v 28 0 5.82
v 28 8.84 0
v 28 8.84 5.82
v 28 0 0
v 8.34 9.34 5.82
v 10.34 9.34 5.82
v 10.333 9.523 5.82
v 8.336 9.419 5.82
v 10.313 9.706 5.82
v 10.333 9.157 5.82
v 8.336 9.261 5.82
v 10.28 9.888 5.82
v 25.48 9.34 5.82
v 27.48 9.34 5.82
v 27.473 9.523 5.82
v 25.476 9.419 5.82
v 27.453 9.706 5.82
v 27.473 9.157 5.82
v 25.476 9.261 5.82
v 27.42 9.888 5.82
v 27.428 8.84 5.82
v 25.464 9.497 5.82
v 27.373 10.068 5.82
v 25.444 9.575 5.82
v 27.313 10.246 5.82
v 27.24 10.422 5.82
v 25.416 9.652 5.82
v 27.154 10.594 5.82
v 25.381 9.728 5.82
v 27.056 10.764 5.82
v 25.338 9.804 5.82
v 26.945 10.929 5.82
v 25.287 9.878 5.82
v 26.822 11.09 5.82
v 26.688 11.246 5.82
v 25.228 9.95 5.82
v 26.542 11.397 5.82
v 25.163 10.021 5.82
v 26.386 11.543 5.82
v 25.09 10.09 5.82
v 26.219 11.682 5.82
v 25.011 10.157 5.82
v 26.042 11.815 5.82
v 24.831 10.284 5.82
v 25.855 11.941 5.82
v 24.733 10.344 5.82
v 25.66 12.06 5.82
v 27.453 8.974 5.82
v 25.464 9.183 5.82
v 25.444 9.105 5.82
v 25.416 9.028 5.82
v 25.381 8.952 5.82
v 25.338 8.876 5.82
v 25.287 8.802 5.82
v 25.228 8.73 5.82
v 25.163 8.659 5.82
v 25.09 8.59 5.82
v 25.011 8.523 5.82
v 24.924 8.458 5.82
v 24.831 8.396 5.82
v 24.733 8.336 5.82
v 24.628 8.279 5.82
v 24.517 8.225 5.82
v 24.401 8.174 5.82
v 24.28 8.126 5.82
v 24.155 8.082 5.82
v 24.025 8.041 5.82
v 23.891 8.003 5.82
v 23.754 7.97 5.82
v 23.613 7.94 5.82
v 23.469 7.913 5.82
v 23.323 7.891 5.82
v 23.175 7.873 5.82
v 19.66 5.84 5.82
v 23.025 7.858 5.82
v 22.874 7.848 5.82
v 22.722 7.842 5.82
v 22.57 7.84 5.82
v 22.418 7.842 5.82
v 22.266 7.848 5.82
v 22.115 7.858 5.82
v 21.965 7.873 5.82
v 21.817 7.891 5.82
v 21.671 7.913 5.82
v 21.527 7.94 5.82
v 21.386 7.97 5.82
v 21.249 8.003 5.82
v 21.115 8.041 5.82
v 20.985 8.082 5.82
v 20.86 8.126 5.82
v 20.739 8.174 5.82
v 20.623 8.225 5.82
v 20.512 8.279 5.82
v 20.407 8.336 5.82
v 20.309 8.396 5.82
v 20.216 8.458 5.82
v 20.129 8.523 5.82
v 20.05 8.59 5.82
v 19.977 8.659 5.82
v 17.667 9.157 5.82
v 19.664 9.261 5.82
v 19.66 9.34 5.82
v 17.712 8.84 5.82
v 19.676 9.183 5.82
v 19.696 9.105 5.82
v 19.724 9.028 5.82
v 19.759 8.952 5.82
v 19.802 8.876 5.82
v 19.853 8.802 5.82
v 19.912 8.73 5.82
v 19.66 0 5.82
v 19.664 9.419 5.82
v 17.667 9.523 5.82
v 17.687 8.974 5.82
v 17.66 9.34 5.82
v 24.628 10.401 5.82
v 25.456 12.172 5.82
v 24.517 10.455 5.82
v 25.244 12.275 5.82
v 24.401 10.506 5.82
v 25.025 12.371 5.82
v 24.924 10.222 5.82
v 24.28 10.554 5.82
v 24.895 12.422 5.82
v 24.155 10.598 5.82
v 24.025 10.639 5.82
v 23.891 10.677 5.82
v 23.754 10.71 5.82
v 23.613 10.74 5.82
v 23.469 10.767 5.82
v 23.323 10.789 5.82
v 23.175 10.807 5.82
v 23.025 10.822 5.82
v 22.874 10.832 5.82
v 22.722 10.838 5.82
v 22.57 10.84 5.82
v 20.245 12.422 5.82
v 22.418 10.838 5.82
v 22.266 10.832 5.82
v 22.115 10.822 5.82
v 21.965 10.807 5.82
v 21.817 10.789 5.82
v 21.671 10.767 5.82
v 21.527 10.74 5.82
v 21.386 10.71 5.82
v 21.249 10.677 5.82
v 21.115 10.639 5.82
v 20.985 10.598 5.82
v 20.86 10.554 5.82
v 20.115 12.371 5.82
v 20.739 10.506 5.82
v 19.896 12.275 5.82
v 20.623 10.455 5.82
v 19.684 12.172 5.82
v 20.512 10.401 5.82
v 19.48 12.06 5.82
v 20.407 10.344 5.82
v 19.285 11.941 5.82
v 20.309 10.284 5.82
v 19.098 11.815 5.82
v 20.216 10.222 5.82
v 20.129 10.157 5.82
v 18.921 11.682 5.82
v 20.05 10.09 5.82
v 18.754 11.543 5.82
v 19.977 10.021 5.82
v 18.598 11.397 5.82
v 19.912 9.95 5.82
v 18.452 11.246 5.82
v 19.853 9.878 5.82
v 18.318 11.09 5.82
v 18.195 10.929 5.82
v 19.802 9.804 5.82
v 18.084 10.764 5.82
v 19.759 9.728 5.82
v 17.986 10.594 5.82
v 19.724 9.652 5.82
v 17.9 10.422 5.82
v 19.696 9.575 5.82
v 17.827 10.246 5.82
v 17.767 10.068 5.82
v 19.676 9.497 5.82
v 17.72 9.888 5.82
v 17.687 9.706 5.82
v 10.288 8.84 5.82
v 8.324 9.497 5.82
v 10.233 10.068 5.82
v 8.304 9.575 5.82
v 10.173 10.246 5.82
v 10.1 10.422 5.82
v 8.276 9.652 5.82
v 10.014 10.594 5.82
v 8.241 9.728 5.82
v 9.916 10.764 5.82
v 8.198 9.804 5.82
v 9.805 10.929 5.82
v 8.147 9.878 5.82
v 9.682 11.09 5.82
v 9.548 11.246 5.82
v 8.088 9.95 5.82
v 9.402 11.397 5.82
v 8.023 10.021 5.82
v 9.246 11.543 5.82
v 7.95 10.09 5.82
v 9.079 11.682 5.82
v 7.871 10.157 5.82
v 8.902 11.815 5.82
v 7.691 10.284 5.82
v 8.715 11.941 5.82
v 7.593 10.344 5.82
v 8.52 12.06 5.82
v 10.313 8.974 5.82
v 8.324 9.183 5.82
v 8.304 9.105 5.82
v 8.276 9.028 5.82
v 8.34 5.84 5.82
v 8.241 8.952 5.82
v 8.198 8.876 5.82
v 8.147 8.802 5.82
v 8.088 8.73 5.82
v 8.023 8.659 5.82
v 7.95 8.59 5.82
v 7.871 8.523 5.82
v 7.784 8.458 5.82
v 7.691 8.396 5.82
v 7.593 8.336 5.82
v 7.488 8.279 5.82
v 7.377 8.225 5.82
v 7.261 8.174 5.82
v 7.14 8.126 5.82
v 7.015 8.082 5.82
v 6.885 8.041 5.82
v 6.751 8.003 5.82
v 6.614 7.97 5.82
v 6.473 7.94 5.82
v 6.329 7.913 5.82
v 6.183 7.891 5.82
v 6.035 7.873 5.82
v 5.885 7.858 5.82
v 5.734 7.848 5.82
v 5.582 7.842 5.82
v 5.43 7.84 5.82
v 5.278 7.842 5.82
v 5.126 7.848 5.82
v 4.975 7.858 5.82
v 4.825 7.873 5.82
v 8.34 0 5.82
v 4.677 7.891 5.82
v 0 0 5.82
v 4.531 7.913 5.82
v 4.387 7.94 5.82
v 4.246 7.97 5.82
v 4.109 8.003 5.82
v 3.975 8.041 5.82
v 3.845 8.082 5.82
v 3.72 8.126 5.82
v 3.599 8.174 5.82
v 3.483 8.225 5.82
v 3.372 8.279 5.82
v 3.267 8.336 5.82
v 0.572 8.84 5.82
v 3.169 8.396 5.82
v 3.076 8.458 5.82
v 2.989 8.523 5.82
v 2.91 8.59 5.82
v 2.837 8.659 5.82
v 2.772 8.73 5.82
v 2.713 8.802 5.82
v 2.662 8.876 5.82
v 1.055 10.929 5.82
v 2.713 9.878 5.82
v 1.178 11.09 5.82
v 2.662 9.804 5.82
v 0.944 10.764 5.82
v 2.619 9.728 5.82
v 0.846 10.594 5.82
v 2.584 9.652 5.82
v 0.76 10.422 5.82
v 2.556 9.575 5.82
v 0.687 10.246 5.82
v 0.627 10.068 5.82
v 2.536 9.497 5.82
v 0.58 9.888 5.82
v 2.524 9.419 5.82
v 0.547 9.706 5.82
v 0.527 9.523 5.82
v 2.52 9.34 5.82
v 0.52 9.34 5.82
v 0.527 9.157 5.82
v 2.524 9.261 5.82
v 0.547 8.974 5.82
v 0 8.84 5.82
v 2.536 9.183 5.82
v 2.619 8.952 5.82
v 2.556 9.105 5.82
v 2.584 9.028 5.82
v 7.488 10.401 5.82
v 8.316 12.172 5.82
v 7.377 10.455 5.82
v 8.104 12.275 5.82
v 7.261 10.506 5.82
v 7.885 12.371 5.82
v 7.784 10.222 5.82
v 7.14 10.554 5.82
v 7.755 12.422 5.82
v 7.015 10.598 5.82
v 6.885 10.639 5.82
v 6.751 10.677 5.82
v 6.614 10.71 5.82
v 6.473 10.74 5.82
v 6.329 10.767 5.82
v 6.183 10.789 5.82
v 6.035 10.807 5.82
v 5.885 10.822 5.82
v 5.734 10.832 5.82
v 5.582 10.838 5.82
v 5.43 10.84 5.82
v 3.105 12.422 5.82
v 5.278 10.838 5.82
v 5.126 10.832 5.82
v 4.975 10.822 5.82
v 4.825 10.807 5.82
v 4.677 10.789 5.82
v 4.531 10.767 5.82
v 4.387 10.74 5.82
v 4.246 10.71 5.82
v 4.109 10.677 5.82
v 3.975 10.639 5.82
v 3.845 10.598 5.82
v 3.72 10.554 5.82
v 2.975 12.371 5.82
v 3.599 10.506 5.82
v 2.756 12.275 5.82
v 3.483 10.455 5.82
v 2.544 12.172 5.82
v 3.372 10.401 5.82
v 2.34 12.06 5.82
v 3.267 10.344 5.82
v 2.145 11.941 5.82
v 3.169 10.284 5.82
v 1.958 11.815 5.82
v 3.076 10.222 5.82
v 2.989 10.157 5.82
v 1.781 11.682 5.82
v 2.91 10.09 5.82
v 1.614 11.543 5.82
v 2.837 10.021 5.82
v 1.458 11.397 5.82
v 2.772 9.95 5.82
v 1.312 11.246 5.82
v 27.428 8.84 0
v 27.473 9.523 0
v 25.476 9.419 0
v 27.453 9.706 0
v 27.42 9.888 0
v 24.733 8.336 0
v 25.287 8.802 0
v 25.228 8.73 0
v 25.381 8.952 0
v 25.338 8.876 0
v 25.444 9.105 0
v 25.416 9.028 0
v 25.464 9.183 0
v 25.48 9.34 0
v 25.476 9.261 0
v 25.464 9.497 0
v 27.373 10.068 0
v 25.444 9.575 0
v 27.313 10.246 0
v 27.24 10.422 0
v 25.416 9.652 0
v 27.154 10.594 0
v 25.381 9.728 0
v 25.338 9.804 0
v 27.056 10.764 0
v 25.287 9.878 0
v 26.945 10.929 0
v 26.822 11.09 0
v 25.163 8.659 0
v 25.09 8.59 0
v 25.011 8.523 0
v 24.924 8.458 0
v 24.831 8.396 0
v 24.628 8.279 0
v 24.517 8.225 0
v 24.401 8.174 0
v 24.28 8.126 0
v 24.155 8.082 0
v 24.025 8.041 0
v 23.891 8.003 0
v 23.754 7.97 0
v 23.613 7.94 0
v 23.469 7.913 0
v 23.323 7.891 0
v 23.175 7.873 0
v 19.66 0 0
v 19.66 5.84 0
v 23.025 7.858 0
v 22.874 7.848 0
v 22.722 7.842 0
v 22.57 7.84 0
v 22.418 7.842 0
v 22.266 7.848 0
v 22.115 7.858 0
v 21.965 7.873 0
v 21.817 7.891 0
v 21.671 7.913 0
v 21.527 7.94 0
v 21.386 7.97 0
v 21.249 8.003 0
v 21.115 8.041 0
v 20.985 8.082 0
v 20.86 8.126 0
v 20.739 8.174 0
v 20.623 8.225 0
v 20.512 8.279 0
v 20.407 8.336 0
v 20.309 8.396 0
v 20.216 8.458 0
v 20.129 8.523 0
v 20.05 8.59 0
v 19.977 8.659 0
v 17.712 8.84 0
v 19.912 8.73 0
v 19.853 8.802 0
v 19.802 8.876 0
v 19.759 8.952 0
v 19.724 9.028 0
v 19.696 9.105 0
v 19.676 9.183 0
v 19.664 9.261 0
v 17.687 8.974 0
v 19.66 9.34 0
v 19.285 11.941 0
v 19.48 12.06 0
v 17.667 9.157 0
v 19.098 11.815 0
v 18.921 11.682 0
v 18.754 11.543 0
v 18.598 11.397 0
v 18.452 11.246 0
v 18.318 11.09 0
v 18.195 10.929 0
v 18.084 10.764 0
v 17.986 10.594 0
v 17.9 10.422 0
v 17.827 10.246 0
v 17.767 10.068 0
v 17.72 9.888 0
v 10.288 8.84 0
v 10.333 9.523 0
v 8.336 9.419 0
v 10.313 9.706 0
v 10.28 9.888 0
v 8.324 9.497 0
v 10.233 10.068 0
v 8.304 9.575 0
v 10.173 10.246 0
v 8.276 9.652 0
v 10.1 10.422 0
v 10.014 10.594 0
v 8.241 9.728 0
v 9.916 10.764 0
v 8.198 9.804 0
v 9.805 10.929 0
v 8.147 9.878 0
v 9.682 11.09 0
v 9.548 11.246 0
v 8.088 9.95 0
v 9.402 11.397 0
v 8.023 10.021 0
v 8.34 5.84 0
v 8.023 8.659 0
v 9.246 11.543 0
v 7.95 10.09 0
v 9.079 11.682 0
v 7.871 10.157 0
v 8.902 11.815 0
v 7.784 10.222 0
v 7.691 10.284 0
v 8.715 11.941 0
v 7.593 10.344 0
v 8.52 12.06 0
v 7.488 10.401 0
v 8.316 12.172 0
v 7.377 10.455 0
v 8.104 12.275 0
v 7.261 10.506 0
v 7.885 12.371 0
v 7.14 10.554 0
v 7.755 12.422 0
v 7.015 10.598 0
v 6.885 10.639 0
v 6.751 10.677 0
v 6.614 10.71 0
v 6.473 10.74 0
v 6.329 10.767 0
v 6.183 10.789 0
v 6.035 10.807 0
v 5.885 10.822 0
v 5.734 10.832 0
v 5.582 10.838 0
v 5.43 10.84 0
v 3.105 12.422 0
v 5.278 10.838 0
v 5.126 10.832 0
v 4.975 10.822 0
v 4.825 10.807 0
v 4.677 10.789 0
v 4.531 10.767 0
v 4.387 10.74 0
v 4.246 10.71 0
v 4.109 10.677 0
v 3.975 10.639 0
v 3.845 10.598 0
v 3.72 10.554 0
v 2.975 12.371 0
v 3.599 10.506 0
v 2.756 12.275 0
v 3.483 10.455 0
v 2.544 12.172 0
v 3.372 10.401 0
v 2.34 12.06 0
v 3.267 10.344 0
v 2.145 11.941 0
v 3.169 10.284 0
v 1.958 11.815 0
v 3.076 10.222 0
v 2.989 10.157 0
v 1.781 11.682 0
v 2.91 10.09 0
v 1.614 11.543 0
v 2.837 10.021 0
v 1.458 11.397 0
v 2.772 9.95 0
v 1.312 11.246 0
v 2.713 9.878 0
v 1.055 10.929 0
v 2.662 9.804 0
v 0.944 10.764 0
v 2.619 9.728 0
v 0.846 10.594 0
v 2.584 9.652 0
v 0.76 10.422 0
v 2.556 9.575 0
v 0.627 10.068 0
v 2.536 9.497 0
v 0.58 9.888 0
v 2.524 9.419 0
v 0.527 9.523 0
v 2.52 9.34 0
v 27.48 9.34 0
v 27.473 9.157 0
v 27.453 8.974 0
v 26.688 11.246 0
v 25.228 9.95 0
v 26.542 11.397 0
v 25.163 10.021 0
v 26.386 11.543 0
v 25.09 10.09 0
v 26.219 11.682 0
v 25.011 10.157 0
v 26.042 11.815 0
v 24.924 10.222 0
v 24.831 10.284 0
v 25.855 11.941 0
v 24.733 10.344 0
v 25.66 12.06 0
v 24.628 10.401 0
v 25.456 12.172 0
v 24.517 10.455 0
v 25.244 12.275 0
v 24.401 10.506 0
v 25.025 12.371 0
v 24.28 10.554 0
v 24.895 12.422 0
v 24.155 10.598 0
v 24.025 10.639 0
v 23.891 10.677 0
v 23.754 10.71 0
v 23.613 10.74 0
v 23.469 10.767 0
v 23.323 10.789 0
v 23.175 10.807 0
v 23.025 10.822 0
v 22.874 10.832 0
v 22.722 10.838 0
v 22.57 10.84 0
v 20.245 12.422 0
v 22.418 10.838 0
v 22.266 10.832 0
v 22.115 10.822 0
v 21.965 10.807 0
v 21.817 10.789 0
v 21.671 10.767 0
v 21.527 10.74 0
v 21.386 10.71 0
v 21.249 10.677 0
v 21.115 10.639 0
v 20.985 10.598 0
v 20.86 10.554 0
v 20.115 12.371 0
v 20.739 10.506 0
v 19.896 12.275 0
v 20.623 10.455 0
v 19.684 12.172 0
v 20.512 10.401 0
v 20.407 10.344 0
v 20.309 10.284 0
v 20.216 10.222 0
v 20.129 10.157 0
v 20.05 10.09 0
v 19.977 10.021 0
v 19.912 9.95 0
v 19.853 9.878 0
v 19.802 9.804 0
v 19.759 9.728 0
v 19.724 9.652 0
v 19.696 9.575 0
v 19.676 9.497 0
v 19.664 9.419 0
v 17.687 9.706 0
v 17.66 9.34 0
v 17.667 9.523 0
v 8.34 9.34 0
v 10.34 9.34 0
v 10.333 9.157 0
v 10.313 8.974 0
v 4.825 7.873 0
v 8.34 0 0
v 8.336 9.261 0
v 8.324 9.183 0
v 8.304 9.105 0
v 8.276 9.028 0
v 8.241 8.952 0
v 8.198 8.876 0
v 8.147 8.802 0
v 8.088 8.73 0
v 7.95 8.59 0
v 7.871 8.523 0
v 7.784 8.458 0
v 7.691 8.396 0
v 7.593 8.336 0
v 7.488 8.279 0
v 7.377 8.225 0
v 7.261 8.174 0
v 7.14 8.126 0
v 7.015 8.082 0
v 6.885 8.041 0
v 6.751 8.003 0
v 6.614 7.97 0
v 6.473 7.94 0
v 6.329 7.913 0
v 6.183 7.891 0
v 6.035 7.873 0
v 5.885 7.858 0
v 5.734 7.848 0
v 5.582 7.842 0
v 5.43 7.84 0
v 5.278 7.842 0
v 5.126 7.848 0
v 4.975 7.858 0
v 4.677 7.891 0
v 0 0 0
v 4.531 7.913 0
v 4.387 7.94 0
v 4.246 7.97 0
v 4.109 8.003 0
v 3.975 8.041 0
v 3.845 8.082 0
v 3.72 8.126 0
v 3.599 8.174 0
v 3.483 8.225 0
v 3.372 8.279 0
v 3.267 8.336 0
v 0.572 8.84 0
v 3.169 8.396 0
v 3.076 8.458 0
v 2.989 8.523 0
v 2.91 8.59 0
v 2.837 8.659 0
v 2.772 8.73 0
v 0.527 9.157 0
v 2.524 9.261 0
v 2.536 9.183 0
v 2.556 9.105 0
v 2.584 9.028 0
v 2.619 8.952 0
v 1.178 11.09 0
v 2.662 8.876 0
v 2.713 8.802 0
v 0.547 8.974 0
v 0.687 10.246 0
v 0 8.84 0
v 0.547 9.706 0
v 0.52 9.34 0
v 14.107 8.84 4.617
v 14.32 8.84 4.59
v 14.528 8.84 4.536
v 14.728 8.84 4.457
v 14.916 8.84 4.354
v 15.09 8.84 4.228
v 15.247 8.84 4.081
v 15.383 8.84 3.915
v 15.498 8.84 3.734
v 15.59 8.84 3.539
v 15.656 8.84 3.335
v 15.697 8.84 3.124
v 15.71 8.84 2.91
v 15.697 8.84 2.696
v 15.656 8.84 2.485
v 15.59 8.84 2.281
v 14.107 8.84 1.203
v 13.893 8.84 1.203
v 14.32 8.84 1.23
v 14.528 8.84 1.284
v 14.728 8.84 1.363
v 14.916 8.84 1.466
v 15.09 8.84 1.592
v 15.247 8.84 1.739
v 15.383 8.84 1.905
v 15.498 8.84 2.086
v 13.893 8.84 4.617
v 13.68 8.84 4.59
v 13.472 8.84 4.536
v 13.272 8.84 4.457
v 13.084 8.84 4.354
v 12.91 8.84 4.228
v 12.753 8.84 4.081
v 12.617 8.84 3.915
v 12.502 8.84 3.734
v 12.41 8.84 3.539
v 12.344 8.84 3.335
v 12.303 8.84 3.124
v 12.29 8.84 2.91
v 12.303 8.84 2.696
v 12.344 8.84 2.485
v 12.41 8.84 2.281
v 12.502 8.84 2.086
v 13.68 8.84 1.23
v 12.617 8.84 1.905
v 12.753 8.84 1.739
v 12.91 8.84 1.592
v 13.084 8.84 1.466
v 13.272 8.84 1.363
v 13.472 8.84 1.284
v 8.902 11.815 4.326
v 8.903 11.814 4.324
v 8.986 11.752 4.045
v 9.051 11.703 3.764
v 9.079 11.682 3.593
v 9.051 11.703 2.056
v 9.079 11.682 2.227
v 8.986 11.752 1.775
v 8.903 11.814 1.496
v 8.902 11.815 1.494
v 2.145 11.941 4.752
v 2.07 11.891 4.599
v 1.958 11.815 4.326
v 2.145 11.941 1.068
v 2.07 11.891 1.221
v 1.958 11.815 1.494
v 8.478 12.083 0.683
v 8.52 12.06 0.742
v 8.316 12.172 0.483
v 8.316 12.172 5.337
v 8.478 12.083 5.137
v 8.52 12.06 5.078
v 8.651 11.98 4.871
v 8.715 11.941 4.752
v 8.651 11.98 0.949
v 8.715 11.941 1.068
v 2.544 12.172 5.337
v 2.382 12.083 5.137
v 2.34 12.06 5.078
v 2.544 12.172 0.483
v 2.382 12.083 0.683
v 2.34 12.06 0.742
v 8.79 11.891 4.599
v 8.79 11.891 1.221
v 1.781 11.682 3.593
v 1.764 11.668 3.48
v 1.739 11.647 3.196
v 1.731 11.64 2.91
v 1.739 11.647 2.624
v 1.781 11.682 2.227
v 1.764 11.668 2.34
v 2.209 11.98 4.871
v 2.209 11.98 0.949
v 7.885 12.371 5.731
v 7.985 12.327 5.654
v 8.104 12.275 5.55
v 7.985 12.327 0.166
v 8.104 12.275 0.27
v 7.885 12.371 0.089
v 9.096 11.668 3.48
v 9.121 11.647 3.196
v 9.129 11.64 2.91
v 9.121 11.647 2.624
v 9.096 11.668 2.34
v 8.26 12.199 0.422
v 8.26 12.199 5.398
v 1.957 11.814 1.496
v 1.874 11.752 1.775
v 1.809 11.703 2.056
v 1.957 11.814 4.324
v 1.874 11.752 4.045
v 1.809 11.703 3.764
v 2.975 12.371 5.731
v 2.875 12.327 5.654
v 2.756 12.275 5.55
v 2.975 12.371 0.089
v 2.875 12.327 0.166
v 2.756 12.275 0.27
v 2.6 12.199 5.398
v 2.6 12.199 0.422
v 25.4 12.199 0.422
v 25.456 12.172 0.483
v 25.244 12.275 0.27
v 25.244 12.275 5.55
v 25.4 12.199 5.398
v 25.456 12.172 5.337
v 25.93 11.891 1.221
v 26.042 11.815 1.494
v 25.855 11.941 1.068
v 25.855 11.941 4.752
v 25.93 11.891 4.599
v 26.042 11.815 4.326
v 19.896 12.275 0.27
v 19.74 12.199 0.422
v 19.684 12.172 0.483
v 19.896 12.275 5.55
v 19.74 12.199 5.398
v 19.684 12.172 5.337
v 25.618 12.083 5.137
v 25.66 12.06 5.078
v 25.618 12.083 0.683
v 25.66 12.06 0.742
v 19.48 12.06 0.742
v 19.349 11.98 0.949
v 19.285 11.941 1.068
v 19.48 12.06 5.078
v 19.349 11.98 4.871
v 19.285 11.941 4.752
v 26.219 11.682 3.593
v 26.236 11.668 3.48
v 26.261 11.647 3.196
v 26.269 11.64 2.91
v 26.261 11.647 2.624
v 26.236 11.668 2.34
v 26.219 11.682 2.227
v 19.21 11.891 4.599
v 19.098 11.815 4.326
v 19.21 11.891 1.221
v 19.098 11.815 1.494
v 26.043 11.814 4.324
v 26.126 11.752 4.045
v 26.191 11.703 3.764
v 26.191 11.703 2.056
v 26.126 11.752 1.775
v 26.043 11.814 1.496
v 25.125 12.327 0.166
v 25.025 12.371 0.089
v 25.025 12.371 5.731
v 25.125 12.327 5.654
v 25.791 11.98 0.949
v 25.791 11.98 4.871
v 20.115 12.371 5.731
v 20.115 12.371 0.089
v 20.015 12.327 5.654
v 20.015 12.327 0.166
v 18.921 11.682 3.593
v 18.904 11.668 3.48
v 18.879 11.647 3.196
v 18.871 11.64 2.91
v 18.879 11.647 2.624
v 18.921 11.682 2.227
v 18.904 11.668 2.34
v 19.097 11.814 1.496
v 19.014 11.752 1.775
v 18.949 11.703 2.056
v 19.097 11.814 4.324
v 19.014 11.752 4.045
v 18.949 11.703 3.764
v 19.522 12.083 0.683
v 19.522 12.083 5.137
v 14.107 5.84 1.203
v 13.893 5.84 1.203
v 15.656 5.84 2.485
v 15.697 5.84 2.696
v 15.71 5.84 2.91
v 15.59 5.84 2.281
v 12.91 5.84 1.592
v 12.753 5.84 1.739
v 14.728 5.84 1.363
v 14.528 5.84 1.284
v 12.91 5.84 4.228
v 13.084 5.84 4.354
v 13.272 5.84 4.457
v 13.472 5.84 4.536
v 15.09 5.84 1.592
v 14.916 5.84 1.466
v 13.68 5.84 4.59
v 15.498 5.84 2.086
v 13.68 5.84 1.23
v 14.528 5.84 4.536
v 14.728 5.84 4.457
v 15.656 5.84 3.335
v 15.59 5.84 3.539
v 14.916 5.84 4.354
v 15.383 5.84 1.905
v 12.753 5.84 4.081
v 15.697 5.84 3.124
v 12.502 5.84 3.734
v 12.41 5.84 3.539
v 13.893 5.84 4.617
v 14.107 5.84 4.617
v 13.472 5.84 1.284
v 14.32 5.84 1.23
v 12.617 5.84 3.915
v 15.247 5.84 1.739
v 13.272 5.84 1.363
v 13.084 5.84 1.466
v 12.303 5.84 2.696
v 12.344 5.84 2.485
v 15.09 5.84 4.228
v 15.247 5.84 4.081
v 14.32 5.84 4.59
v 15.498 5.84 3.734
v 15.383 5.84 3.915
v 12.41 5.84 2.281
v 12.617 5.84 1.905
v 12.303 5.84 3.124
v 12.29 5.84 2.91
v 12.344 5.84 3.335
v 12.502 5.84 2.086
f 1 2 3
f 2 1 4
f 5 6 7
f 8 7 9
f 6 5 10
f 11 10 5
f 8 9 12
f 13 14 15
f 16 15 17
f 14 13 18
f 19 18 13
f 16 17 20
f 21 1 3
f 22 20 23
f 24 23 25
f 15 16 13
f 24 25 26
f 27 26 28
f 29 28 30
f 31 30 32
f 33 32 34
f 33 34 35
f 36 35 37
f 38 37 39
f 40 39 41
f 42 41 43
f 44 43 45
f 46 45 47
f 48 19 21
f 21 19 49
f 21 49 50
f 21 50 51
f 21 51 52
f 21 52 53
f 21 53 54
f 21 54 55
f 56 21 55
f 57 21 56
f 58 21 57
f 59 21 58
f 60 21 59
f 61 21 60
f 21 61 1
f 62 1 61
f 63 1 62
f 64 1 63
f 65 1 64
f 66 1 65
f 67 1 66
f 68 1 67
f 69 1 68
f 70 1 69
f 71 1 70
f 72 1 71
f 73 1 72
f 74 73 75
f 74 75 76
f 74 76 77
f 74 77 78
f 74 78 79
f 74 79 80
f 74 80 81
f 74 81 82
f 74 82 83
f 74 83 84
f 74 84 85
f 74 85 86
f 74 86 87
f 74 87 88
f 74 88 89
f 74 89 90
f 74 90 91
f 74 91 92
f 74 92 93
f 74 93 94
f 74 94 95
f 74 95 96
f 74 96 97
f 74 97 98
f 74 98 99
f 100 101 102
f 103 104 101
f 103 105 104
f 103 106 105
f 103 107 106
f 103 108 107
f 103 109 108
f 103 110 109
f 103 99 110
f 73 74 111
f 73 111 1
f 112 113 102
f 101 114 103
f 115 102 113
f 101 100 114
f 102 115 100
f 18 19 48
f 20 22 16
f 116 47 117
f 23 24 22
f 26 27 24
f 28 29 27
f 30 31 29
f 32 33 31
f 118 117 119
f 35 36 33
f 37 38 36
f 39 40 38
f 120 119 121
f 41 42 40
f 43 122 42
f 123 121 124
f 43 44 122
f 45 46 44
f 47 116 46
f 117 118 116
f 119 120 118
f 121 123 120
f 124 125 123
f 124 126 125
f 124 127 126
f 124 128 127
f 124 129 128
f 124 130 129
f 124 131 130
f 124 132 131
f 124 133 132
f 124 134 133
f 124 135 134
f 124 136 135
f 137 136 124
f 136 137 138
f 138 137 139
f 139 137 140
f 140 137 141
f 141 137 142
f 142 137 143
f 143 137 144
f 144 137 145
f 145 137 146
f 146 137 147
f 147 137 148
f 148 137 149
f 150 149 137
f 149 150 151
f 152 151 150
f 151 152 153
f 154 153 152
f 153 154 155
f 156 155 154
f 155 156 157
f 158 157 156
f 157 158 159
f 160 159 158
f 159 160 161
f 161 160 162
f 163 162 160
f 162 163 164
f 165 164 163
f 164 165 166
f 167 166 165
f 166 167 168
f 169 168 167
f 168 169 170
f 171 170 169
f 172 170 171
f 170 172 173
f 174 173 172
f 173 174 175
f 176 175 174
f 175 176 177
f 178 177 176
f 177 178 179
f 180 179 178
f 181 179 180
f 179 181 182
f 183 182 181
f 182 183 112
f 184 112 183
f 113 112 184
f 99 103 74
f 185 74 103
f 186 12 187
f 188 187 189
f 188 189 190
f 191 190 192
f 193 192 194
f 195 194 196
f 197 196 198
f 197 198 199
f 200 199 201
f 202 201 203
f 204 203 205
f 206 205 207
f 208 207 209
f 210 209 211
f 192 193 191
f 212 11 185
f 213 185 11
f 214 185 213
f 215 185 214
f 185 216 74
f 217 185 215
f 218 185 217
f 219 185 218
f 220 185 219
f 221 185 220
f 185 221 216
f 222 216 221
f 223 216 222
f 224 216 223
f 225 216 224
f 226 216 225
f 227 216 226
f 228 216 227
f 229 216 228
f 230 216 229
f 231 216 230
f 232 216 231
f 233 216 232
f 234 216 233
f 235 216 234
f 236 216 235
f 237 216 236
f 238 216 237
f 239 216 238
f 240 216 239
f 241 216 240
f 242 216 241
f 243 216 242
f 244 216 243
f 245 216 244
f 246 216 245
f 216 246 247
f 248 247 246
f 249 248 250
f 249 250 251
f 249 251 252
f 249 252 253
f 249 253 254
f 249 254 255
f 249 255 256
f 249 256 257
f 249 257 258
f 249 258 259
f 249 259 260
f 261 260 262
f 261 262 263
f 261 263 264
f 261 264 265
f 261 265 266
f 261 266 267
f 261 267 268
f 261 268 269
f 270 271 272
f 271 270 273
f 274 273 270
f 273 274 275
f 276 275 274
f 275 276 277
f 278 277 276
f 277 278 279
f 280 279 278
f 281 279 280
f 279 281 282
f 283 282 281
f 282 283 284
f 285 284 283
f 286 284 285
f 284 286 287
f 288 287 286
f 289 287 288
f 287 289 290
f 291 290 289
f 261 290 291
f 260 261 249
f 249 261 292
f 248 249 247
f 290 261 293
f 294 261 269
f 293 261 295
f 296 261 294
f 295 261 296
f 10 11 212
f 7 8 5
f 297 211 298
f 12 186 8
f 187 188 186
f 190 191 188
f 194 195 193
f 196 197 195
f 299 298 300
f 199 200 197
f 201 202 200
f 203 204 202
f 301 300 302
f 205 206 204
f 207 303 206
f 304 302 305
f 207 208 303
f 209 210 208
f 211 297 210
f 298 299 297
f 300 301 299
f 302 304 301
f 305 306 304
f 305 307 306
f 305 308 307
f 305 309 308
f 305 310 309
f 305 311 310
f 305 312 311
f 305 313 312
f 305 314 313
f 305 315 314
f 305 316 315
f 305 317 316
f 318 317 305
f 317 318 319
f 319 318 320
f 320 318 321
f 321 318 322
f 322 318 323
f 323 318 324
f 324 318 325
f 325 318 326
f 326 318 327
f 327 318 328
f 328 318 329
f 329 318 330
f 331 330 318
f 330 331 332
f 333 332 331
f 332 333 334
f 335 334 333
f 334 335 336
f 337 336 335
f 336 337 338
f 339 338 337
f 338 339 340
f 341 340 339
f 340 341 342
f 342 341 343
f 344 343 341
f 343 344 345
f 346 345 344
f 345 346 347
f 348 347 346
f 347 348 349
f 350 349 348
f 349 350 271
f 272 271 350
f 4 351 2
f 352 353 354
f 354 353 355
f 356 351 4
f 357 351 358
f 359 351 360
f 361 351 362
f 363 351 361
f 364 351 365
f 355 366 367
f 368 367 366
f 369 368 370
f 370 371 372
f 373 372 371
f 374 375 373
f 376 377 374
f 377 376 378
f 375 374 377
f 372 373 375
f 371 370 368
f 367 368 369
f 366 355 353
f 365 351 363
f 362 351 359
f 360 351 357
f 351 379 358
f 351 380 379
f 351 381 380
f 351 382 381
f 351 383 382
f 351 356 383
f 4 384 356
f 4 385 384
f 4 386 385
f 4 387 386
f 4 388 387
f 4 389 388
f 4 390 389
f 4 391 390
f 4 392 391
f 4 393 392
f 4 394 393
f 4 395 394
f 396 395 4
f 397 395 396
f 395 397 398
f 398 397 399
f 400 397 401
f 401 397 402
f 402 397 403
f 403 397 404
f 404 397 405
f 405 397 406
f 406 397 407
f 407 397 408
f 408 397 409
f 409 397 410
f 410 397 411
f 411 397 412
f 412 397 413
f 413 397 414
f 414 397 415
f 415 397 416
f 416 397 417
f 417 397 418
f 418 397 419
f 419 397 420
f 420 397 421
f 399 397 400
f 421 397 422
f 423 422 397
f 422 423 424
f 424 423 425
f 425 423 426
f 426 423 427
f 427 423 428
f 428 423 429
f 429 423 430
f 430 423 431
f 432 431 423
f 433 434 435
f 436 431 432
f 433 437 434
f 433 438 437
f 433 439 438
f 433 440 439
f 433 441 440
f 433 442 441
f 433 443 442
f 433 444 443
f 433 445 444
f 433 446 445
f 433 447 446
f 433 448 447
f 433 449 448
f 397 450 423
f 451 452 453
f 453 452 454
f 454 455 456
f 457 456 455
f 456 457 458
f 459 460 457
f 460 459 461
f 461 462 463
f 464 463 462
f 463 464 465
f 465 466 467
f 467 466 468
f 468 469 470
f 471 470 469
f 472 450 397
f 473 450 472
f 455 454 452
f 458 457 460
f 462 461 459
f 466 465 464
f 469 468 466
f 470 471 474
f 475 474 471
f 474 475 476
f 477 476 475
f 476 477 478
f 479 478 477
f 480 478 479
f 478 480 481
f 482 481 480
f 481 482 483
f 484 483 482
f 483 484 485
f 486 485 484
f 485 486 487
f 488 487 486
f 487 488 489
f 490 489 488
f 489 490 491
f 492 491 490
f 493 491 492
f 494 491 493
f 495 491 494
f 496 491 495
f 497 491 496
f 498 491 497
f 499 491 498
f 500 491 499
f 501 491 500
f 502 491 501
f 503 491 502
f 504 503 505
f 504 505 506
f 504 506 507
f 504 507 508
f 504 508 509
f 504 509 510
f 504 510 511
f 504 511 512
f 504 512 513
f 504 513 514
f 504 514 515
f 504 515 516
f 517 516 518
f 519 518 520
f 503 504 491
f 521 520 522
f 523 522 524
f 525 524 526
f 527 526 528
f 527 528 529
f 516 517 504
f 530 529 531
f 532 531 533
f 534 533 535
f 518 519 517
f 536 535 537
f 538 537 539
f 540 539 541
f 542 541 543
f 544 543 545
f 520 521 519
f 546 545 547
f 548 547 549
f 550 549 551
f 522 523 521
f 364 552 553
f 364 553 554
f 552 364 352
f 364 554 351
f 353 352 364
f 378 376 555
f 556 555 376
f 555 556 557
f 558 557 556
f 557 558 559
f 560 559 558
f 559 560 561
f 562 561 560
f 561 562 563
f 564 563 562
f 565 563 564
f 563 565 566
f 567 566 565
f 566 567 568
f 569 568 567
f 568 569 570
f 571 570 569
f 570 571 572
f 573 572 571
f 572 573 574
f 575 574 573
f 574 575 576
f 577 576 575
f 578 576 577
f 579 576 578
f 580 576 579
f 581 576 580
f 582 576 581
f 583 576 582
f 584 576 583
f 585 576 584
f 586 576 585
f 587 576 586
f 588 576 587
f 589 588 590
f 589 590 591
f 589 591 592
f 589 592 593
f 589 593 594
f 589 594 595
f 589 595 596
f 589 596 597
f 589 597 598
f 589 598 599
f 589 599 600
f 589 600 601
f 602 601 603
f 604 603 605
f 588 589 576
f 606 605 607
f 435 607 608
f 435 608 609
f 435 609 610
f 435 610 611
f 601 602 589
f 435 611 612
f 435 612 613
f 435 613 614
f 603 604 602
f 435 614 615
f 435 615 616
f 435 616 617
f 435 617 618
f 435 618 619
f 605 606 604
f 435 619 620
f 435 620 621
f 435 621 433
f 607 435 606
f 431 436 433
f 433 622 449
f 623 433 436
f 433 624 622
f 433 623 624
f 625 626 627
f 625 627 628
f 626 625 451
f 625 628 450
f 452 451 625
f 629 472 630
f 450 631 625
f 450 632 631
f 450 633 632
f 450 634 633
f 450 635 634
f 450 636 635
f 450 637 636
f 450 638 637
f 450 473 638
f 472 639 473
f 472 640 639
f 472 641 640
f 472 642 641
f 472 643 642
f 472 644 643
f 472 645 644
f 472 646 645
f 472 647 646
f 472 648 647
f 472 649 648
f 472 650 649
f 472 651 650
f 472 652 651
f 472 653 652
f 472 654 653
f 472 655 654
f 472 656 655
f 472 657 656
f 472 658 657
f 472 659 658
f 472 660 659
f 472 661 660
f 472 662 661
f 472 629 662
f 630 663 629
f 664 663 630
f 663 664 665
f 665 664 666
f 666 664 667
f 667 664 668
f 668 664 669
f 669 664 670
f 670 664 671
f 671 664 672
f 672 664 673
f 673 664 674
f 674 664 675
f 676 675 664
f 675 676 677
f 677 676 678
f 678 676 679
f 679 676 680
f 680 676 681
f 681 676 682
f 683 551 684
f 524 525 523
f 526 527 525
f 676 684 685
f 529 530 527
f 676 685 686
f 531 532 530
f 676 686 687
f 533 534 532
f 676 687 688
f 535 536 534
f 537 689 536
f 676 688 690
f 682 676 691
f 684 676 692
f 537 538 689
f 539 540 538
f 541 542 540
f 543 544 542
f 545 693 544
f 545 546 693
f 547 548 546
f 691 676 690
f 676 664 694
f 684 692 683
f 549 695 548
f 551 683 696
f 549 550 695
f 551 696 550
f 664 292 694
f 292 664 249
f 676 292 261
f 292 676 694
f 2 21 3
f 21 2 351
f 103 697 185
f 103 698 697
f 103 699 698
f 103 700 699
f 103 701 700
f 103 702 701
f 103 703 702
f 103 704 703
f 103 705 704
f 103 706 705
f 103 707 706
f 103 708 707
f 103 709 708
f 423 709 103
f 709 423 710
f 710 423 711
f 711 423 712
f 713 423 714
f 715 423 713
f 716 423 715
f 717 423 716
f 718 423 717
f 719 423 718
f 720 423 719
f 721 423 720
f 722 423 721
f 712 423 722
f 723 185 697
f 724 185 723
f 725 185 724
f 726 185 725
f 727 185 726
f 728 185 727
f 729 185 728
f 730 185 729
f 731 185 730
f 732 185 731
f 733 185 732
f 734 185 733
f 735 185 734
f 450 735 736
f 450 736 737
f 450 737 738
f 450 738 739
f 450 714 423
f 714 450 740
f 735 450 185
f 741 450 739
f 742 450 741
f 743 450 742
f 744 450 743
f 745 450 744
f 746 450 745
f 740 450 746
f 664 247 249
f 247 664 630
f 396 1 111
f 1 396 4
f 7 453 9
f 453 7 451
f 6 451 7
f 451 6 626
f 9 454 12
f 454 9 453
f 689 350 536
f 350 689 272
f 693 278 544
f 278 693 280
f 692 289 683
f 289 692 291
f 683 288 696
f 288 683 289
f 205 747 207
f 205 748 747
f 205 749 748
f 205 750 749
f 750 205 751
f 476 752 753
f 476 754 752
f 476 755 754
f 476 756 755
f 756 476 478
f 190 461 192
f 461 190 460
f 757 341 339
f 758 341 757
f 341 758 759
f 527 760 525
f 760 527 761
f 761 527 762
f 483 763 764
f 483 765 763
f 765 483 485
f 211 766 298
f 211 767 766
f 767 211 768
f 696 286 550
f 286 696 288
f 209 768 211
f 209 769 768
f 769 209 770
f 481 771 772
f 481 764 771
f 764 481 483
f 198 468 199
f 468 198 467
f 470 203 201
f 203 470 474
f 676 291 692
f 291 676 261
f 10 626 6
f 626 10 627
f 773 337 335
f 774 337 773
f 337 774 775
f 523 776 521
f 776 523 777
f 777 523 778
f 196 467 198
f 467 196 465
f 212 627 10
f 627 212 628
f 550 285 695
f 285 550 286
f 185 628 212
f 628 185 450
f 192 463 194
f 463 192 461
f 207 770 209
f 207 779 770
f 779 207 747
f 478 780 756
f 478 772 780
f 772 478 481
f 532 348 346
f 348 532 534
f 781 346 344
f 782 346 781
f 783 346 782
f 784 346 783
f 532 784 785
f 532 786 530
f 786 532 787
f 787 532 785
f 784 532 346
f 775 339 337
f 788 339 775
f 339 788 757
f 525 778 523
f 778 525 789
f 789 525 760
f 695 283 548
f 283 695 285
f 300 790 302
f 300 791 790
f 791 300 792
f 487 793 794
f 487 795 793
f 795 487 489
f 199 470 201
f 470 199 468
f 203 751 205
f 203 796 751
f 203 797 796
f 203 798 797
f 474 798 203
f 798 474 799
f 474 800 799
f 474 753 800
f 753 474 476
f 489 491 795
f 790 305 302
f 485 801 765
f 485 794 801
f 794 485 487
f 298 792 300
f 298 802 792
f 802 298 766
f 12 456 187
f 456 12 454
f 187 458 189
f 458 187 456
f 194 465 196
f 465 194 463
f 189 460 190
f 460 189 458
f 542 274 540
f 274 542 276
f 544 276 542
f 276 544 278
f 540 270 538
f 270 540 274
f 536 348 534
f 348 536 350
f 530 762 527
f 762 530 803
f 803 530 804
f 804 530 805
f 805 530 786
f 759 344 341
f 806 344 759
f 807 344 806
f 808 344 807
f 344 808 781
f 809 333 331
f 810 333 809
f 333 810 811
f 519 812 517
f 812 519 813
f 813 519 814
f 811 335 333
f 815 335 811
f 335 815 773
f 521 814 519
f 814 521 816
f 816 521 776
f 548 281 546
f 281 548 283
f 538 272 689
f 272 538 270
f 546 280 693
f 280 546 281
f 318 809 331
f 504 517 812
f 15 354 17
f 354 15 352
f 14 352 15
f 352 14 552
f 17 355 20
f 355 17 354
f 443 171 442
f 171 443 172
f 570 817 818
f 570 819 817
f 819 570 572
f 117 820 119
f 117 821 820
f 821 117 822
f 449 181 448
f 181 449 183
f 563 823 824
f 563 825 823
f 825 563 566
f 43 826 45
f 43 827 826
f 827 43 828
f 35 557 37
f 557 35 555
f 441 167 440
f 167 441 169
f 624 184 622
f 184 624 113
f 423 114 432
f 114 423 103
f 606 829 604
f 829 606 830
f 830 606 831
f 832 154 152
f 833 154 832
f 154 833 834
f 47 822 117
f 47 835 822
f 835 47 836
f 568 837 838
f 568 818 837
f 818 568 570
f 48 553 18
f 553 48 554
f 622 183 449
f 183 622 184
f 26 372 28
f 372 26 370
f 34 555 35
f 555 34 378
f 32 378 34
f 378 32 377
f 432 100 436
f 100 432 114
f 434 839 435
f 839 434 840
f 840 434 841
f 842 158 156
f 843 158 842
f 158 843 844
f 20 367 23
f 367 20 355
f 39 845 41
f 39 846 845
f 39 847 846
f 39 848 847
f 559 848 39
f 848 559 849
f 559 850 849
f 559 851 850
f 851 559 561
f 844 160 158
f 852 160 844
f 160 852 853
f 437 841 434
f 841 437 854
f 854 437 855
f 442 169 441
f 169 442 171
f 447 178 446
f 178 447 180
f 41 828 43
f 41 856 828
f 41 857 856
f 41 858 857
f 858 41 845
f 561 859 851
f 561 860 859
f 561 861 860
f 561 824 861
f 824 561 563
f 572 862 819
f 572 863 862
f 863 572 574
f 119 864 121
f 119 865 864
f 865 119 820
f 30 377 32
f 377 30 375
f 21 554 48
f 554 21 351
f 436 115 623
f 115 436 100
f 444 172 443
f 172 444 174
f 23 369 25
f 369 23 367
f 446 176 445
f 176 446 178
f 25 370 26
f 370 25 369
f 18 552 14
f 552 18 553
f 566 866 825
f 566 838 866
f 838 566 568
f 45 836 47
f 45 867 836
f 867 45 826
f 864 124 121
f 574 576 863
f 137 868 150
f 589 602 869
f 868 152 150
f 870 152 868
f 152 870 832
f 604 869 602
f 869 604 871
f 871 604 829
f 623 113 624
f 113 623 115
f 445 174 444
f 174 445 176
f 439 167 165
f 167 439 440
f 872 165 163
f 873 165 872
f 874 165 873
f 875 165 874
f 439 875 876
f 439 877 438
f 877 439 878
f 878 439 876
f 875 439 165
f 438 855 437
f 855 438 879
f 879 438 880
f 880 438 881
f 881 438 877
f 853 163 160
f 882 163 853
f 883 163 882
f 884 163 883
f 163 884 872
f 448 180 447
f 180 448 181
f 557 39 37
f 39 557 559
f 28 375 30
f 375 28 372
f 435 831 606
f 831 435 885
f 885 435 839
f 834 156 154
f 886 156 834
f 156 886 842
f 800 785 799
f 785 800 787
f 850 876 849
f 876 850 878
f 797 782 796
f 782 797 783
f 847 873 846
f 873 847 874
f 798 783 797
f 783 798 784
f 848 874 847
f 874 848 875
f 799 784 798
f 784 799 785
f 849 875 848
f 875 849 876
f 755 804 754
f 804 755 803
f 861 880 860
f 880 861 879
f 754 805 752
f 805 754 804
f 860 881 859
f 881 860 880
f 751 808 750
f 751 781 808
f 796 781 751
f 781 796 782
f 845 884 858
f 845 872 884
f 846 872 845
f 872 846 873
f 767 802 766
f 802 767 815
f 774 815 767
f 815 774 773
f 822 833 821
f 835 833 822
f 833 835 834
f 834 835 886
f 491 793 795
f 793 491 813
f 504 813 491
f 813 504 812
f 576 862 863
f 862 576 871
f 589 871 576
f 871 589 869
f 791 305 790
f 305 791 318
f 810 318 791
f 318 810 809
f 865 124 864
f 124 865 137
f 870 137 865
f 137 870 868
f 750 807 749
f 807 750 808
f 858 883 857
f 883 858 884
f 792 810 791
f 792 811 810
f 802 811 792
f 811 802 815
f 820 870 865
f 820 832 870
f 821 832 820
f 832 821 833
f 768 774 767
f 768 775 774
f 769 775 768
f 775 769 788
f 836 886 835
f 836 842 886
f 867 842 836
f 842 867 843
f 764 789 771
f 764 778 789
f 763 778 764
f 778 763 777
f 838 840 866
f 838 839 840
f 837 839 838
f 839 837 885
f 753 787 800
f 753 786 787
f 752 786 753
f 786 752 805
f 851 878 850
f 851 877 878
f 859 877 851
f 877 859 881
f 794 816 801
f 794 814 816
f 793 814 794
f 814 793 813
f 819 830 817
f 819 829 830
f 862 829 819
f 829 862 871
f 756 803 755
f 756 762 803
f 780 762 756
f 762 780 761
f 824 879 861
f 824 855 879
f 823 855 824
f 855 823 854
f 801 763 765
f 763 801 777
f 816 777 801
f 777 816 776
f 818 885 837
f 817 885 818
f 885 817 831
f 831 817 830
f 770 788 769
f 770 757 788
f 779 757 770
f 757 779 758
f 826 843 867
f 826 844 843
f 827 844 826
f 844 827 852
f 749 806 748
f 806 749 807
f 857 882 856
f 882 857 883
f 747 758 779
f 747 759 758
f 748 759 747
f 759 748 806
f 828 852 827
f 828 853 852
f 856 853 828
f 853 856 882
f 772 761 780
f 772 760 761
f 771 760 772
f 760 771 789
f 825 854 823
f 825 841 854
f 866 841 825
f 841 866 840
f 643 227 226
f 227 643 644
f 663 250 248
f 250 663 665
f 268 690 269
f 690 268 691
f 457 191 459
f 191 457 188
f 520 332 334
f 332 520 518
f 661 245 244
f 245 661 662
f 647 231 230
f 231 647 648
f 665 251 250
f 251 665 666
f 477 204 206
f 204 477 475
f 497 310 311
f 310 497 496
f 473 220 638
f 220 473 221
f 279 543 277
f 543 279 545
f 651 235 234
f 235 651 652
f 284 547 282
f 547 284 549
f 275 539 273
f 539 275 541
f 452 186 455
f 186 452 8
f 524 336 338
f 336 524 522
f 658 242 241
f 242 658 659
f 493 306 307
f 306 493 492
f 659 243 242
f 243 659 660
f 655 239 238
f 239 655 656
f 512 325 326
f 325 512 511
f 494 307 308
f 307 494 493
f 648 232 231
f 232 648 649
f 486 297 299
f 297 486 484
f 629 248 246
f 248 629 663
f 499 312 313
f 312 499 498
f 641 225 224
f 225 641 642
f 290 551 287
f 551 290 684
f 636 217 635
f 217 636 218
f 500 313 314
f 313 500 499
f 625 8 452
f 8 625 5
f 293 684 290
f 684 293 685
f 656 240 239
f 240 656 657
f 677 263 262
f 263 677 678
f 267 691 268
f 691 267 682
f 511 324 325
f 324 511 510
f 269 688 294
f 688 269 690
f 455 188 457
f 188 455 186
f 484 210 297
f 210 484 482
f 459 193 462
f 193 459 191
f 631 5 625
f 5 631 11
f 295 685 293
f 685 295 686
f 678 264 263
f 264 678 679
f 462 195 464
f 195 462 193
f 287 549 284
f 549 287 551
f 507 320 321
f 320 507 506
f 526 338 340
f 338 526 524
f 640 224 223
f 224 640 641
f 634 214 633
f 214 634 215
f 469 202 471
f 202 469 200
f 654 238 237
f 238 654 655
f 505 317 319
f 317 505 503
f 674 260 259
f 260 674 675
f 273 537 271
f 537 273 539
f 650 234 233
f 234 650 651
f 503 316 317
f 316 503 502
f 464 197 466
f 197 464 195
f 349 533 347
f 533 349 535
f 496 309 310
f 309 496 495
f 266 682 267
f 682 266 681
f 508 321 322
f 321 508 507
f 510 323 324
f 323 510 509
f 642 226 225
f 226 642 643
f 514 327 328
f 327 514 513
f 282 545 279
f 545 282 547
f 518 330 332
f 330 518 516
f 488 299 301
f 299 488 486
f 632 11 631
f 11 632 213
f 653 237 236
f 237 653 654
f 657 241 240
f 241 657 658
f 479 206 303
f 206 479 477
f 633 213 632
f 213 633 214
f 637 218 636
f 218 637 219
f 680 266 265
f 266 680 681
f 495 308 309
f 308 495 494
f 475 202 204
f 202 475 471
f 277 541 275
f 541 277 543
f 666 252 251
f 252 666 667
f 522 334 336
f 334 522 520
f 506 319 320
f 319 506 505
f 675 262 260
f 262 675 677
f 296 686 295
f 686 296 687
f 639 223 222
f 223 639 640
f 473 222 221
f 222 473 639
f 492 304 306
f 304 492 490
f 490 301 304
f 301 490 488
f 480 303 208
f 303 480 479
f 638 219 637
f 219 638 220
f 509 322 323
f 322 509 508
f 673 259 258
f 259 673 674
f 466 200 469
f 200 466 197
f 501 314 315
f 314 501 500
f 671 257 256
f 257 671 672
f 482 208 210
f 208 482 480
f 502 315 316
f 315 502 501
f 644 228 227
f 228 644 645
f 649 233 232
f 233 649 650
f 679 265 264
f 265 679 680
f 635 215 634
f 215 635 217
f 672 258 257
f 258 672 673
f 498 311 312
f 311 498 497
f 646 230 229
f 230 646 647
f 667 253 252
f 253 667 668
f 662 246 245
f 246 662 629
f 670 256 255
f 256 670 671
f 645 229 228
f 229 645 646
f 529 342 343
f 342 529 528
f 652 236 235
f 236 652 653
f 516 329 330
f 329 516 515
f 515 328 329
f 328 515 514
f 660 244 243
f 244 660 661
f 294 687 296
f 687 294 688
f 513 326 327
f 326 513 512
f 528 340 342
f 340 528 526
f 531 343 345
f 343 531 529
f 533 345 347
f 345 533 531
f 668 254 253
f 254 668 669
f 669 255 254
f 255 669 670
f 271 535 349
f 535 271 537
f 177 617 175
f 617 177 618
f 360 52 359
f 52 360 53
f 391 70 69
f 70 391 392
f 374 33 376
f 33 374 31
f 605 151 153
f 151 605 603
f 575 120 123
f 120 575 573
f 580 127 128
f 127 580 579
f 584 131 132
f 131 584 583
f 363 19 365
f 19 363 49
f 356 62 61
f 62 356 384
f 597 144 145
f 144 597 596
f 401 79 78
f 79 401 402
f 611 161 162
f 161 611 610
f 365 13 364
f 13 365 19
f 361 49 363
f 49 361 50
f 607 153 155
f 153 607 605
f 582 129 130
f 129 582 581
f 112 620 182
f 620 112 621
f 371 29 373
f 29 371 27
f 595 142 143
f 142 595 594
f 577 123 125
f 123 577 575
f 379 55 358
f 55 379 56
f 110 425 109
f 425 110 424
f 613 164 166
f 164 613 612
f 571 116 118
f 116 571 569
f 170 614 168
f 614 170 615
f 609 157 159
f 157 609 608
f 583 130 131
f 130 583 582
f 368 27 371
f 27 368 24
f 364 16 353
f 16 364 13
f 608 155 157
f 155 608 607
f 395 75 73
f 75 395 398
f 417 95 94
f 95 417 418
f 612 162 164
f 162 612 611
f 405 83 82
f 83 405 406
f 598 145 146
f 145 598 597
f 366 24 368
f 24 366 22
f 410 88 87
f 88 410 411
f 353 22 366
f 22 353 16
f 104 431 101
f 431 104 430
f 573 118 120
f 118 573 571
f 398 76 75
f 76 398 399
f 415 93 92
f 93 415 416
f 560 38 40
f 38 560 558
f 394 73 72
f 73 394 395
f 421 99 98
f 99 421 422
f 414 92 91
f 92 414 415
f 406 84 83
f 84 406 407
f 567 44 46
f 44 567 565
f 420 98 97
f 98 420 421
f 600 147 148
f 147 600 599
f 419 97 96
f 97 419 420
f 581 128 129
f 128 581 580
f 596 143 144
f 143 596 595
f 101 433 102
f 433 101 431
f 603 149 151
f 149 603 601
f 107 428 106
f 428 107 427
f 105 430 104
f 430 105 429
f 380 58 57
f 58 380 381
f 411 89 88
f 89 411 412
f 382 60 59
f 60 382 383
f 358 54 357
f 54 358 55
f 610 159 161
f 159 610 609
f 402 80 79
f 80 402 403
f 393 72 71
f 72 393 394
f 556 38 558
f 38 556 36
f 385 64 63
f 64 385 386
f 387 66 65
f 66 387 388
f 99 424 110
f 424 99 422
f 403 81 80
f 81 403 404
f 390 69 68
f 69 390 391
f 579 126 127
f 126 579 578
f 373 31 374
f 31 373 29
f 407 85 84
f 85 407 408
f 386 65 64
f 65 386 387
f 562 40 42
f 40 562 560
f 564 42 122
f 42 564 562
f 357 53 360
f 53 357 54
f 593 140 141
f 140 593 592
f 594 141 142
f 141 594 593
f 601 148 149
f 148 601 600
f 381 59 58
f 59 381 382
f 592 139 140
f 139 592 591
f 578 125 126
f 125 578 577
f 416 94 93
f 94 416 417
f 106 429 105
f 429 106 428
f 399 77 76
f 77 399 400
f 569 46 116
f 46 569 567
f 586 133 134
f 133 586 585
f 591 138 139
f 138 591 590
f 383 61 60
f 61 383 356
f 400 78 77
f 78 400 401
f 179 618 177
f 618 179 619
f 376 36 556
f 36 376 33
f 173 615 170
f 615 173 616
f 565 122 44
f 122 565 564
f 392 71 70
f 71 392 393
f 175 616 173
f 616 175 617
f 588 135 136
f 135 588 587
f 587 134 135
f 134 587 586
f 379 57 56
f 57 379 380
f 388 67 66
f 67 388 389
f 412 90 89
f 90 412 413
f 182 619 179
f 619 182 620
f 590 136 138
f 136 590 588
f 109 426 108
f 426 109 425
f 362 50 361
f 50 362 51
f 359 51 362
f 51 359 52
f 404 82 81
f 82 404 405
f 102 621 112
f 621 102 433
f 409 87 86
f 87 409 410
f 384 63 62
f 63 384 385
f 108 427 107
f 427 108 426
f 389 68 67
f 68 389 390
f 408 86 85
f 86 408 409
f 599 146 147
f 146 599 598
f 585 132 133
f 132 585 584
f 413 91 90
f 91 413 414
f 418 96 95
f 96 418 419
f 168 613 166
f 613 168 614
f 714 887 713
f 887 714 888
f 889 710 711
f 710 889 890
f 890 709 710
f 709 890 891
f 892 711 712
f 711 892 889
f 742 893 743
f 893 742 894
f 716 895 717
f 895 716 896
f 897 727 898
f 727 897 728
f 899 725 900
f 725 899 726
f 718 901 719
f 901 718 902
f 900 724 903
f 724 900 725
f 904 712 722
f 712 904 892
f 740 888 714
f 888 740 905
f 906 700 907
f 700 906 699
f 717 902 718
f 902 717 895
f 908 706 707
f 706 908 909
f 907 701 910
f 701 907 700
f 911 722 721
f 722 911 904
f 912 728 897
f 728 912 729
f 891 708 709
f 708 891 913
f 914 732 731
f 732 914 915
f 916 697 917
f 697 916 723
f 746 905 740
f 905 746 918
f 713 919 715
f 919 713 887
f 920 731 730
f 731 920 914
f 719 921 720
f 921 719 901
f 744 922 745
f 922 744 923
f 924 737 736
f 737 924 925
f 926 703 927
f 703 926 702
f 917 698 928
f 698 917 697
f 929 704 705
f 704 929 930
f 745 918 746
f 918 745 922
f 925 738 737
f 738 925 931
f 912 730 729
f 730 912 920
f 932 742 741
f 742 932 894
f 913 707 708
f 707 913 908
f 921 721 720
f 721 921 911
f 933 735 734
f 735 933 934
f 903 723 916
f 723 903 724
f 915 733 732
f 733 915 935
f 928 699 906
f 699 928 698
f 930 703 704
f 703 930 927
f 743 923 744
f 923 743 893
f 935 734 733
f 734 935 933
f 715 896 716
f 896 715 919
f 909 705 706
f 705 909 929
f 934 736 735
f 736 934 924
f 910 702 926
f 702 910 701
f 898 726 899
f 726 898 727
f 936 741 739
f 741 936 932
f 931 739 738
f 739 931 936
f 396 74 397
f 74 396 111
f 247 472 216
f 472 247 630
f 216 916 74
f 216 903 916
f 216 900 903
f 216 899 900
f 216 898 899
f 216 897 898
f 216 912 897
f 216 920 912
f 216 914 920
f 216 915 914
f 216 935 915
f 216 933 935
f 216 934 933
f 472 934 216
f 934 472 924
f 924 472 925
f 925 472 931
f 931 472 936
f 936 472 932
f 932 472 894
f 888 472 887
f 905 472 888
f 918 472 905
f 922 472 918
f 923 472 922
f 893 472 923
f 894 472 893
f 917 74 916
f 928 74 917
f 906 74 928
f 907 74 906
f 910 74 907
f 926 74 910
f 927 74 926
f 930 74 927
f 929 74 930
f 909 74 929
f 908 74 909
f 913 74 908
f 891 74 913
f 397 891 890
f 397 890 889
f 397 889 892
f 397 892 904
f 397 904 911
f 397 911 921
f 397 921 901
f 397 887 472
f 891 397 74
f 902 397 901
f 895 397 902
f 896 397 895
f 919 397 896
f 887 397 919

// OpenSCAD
radial_clearance = 0.16;
diametric_clearance = radial_clearance*2;

side_wall = 3;
clip_length = 22+2*side_wall;
clip_thickness = 6.14 - diametric_clearance;

track_height = 6.0 - radial_clearance;
clip_height = track_height + 3;

hole_horizontal = 5.5+diametric_clearance;
hole_height = 3;
hole_wall = 2;
curve_sink = hole_wall-0.8;

color("green")
e2020_ziptie_clip(hammer_nut=true);

//color("silver")
//translate([clip_length/2-10.4/2,0,0])
//cube([10,4.3,5.9]);

module e2020_ziptie_clip(hammer_nut=false)
{
  difference()
  {
      union()
      {
          cube([clip_length,clip_height,clip_thickness]);
          
          translate([clip_length/2-7/2-radial_clearance-hole_horizontal/2-hole_wall,(hole_height+hole_wall*2)/2+track_height,0])
          scale([hole_horizontal+hole_wall*2,hole_height+hole_wall*2,1])
          cylinder(d=1,h=clip_thickness,$fn=120);
          
          translate([clip_length/2+(7/2+radial_clearance+hole_horizontal/2+hole_wall),(hole_height+hole_wall*2)/2+track_height,0])
          scale([hole_horizontal+hole_wall*2,hole_height+hole_wall*2,1])
          cylinder(d=1,h=clip_thickness,$fn=120);
      }
      
      translate([0,(hole_height+hole_wall*2)/2+track_height+clip_thickness+(hole_height+hole_wall*2)/2-curve_sink,clip_thickness/2])
      rotate([0,90,0])
      cylinder(d=2*clip_thickness,h=clip_length,$fn=128);
      
      translate([clip_length/2-7/2-radial_clearance-hole_horizontal/2-hole_wall,(hole_height+hole_wall*2)/2+track_height,-1])
      scale([hole_horizontal,hole_height,1])
      cylinder(d=1,h=clip_thickness+2,$fn=120);
      
      translate([clip_length/2+7/2+radial_clearance+hole_horizontal/2+hole_wall,(hole_height+hole_wall*2)/2+track_height,-1])
      scale([hole_horizontal,hole_height,1])
      cylinder(d=1,h=clip_thickness+2,$fn=120);
      
      //Screw
      translate([clip_length/2,-1,clip_thickness/2])
      rotate([-90,0,0])
      cylinder(d=3.1+diametric_clearance,h=clip_height+2,$fn=50);
      
      if (hammer_nut)
      {
        //Cube cut for tnut
        translate([-(11+diametric_clearance)/2+clip_length/2,-1,-1])
        cube([11+diametric_clearance,track_height+1,clip_thickness+2]);
      }
      else
      {
        //Cube cut for tnut
        translate([side_wall,-1,-1])
        cube([clip_length-2*side_wall,track_height+1,clip_thickness+2]);
      }
  }
}
